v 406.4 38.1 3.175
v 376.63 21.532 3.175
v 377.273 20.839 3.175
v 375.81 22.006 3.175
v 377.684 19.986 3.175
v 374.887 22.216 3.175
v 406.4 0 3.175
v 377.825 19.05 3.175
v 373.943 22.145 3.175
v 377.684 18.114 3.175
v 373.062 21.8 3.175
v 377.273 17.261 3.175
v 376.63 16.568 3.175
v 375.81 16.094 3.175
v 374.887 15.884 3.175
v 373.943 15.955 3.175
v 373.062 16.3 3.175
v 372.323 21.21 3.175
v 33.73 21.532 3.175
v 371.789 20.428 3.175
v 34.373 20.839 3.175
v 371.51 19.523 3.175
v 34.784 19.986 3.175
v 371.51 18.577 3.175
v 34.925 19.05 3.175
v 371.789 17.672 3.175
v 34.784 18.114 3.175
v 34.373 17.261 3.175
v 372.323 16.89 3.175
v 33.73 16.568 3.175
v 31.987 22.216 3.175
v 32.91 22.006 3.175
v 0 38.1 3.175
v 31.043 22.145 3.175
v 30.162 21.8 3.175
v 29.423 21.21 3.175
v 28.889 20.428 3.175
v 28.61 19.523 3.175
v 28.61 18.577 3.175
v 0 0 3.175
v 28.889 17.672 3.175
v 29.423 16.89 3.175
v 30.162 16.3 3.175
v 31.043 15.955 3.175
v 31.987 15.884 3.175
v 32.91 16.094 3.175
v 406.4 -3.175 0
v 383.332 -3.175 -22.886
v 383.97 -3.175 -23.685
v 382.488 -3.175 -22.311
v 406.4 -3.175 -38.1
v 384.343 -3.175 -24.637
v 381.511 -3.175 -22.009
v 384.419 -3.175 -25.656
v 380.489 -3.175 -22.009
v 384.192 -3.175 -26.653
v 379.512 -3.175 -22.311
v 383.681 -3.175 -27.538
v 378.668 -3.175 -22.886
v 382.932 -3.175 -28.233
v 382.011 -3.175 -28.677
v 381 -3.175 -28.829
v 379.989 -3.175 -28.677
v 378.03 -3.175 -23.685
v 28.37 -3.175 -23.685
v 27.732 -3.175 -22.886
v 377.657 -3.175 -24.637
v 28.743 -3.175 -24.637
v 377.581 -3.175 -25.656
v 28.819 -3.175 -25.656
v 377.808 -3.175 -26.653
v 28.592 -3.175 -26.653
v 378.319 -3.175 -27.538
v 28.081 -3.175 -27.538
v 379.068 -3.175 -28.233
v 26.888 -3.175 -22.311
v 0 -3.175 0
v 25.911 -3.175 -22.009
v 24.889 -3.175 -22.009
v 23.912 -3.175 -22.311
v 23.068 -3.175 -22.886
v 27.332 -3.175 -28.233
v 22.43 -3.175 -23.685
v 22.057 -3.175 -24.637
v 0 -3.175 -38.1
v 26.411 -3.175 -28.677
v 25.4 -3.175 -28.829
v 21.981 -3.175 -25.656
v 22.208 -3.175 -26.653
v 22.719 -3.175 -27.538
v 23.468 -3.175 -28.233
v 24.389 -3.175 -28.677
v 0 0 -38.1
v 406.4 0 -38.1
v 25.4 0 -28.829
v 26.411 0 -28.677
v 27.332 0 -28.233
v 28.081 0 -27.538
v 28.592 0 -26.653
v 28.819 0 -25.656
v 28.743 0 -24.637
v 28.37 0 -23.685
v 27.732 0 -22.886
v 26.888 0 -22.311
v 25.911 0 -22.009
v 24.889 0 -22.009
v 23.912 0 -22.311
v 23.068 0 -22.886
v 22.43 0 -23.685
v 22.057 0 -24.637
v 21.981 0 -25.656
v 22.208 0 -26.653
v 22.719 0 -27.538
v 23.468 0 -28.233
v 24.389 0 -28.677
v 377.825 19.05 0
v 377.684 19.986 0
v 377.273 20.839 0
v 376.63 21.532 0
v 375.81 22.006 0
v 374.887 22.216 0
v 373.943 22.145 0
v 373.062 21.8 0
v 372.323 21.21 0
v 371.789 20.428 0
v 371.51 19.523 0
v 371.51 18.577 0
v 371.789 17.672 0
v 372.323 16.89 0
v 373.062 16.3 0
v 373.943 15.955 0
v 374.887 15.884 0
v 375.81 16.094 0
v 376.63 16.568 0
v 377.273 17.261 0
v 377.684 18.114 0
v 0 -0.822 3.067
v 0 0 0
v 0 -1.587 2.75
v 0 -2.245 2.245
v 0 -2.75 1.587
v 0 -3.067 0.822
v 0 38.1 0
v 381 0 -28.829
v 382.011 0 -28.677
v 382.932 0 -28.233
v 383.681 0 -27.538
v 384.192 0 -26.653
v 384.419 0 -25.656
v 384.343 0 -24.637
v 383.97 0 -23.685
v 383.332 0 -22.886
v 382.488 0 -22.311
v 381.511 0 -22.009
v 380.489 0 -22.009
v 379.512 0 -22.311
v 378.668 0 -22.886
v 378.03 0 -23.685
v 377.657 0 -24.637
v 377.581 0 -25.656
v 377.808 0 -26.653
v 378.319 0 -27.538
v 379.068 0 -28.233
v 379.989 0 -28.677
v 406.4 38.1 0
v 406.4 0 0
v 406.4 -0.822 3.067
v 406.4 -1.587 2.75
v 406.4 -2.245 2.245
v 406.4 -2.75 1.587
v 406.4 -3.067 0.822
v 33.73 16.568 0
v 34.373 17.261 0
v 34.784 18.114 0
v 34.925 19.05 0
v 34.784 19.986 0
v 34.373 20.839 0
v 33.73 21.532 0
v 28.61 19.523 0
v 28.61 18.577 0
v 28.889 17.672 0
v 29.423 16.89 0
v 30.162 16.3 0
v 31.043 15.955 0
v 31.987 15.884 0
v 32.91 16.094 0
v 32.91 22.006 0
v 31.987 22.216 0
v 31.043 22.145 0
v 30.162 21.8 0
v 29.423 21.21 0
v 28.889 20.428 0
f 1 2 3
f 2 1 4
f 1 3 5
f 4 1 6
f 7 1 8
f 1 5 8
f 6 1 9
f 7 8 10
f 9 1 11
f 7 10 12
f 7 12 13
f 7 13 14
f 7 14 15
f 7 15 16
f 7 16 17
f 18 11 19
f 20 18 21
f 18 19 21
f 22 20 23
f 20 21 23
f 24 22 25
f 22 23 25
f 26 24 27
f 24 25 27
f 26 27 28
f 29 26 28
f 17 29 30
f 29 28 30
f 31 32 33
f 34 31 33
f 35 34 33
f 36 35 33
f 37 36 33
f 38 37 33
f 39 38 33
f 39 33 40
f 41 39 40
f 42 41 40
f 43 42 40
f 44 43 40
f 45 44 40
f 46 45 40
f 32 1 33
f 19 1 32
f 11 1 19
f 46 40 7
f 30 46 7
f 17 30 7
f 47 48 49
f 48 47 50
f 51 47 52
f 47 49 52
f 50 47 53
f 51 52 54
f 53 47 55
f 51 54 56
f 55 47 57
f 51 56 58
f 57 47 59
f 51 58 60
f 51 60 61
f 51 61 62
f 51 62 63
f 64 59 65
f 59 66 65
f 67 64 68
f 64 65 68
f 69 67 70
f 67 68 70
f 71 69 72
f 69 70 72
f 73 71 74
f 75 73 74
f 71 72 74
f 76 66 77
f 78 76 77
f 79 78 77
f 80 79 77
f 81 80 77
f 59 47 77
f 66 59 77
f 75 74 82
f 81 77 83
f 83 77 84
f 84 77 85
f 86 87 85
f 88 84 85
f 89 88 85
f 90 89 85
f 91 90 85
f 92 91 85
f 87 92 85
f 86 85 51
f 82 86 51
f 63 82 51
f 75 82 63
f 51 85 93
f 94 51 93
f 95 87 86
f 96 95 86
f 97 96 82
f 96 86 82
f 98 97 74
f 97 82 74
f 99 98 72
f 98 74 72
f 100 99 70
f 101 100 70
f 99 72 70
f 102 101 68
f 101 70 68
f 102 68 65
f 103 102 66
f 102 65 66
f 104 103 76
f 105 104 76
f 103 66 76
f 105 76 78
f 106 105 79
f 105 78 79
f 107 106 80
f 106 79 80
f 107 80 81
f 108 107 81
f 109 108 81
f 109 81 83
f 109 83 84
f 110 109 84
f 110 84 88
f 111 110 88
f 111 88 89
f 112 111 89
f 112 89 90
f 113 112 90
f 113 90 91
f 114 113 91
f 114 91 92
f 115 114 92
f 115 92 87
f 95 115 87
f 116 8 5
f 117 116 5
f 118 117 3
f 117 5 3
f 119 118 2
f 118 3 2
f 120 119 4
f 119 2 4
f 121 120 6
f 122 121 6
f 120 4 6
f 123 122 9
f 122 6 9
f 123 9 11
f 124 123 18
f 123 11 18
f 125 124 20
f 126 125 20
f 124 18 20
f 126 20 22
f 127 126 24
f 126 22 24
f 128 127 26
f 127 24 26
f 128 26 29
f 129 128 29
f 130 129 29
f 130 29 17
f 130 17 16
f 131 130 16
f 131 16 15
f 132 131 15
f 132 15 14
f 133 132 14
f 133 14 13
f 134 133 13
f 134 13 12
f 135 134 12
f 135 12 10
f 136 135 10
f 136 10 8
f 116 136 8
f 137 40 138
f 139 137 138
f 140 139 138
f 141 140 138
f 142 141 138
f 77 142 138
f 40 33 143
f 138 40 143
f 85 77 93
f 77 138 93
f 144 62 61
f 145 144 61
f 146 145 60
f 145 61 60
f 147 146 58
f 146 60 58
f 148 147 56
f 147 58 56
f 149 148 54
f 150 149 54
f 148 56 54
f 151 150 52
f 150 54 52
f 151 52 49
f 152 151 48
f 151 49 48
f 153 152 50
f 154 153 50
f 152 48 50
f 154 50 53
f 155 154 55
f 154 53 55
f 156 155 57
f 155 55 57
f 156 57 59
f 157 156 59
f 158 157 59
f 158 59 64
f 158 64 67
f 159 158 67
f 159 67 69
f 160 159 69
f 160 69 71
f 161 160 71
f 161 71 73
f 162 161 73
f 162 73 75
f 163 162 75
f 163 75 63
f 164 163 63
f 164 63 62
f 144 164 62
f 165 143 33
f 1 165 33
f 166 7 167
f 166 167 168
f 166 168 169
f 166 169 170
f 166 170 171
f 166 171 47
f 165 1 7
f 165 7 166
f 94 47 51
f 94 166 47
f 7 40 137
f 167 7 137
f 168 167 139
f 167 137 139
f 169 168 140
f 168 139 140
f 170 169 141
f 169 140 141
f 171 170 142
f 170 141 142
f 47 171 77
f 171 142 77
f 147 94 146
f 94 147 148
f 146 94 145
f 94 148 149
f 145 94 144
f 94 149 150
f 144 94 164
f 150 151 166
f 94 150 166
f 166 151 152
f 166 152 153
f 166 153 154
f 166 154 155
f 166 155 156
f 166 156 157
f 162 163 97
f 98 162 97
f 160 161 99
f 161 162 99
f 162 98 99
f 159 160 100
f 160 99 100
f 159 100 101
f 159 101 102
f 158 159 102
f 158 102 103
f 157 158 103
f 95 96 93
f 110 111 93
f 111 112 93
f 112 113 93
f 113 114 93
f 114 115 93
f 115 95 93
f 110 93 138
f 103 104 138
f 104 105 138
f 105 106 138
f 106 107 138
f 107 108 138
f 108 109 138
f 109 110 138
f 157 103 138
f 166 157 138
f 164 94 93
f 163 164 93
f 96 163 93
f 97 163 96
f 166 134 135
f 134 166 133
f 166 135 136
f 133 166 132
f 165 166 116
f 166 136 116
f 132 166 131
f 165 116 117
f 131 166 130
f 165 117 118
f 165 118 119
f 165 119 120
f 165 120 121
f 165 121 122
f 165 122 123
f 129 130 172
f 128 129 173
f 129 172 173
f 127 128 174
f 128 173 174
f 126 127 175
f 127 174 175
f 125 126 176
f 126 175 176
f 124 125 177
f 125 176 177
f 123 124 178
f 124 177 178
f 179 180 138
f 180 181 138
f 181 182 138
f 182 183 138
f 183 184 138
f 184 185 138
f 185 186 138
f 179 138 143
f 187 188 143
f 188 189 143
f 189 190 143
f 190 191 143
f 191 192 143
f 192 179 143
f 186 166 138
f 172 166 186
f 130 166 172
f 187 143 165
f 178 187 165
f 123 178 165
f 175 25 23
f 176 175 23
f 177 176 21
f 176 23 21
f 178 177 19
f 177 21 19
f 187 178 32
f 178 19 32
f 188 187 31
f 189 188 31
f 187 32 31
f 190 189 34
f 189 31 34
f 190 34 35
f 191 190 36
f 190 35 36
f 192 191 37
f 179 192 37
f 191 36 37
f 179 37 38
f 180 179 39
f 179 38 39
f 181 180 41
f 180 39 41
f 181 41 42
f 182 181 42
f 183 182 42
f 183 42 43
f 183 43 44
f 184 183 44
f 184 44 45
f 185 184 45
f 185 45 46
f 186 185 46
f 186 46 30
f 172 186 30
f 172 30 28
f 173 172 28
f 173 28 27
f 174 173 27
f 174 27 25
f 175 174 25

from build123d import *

# Parameters (mm, degrees)
BASE_FLANGE1_DEPTH = 406.4
SKETCH6_R          = 3.175
CUT_EXTRUDE1_DEPTH = 6.35
SKETCH7_R          = 3.429
CUT_EXTRUDE2_DEPTH = 6.35


# Read off the part's stored shape, not the designer's step: Base-Flange1
with BuildPart() as part:
    # Base-Flange1 outline → Base-Flange1 (new body)
    with BuildSketch(Plane(origin=(0, 0, 0), x_dir=(0, 0, -1), z_dir=(1, 0, 0))):
        with BuildLine():
            Line((0, -3.175), (38.1, -3.175))
            Line((38.1, -3.175), (38.1, 0))
            Line((38.1, 0), (0, 0))
            Line((0, 0), (0, 38.1))
            Line((0, 38.1), (-3.175, 38.1))
            Line((-3.175, 38.1), (-3.175, 0))
            ThreePointArc((-3.175, 0), (-2.24506403, -2.24506403), (0, -3.175))
        make_face()
    extrude(amount=BASE_FLANGE1_DEPTH)

    # Sketch6 → Cut-Extrude1 (cut)
    with BuildSketch(Plane.XY.offset(3.175)):
        with Locations((31.75, 19.05)):
            Circle(SKETCH6_R)
        with Locations((374.65, 19.05)):
            Circle(SKETCH6_R)
    extrude(amount=-CUT_EXTRUDE1_DEPTH, mode=Mode.SUBTRACT)

    # Sketch7 → Cut-Extrude2 (cut)
    with BuildSketch(Plane.XZ.offset(3.175)):
        with Locations(Location((25.4, -25.4, 0), (0, 0, 270))):
            Circle(SKETCH7_R)
        with Locations(Location((381, -25.4, 0), (0, 0, 270))):
            Circle(SKETCH7_R)
    extrude(amount=-CUT_EXTRUDE2_DEPTH, mode=Mode.SUBTRACT)


solid = part.part
